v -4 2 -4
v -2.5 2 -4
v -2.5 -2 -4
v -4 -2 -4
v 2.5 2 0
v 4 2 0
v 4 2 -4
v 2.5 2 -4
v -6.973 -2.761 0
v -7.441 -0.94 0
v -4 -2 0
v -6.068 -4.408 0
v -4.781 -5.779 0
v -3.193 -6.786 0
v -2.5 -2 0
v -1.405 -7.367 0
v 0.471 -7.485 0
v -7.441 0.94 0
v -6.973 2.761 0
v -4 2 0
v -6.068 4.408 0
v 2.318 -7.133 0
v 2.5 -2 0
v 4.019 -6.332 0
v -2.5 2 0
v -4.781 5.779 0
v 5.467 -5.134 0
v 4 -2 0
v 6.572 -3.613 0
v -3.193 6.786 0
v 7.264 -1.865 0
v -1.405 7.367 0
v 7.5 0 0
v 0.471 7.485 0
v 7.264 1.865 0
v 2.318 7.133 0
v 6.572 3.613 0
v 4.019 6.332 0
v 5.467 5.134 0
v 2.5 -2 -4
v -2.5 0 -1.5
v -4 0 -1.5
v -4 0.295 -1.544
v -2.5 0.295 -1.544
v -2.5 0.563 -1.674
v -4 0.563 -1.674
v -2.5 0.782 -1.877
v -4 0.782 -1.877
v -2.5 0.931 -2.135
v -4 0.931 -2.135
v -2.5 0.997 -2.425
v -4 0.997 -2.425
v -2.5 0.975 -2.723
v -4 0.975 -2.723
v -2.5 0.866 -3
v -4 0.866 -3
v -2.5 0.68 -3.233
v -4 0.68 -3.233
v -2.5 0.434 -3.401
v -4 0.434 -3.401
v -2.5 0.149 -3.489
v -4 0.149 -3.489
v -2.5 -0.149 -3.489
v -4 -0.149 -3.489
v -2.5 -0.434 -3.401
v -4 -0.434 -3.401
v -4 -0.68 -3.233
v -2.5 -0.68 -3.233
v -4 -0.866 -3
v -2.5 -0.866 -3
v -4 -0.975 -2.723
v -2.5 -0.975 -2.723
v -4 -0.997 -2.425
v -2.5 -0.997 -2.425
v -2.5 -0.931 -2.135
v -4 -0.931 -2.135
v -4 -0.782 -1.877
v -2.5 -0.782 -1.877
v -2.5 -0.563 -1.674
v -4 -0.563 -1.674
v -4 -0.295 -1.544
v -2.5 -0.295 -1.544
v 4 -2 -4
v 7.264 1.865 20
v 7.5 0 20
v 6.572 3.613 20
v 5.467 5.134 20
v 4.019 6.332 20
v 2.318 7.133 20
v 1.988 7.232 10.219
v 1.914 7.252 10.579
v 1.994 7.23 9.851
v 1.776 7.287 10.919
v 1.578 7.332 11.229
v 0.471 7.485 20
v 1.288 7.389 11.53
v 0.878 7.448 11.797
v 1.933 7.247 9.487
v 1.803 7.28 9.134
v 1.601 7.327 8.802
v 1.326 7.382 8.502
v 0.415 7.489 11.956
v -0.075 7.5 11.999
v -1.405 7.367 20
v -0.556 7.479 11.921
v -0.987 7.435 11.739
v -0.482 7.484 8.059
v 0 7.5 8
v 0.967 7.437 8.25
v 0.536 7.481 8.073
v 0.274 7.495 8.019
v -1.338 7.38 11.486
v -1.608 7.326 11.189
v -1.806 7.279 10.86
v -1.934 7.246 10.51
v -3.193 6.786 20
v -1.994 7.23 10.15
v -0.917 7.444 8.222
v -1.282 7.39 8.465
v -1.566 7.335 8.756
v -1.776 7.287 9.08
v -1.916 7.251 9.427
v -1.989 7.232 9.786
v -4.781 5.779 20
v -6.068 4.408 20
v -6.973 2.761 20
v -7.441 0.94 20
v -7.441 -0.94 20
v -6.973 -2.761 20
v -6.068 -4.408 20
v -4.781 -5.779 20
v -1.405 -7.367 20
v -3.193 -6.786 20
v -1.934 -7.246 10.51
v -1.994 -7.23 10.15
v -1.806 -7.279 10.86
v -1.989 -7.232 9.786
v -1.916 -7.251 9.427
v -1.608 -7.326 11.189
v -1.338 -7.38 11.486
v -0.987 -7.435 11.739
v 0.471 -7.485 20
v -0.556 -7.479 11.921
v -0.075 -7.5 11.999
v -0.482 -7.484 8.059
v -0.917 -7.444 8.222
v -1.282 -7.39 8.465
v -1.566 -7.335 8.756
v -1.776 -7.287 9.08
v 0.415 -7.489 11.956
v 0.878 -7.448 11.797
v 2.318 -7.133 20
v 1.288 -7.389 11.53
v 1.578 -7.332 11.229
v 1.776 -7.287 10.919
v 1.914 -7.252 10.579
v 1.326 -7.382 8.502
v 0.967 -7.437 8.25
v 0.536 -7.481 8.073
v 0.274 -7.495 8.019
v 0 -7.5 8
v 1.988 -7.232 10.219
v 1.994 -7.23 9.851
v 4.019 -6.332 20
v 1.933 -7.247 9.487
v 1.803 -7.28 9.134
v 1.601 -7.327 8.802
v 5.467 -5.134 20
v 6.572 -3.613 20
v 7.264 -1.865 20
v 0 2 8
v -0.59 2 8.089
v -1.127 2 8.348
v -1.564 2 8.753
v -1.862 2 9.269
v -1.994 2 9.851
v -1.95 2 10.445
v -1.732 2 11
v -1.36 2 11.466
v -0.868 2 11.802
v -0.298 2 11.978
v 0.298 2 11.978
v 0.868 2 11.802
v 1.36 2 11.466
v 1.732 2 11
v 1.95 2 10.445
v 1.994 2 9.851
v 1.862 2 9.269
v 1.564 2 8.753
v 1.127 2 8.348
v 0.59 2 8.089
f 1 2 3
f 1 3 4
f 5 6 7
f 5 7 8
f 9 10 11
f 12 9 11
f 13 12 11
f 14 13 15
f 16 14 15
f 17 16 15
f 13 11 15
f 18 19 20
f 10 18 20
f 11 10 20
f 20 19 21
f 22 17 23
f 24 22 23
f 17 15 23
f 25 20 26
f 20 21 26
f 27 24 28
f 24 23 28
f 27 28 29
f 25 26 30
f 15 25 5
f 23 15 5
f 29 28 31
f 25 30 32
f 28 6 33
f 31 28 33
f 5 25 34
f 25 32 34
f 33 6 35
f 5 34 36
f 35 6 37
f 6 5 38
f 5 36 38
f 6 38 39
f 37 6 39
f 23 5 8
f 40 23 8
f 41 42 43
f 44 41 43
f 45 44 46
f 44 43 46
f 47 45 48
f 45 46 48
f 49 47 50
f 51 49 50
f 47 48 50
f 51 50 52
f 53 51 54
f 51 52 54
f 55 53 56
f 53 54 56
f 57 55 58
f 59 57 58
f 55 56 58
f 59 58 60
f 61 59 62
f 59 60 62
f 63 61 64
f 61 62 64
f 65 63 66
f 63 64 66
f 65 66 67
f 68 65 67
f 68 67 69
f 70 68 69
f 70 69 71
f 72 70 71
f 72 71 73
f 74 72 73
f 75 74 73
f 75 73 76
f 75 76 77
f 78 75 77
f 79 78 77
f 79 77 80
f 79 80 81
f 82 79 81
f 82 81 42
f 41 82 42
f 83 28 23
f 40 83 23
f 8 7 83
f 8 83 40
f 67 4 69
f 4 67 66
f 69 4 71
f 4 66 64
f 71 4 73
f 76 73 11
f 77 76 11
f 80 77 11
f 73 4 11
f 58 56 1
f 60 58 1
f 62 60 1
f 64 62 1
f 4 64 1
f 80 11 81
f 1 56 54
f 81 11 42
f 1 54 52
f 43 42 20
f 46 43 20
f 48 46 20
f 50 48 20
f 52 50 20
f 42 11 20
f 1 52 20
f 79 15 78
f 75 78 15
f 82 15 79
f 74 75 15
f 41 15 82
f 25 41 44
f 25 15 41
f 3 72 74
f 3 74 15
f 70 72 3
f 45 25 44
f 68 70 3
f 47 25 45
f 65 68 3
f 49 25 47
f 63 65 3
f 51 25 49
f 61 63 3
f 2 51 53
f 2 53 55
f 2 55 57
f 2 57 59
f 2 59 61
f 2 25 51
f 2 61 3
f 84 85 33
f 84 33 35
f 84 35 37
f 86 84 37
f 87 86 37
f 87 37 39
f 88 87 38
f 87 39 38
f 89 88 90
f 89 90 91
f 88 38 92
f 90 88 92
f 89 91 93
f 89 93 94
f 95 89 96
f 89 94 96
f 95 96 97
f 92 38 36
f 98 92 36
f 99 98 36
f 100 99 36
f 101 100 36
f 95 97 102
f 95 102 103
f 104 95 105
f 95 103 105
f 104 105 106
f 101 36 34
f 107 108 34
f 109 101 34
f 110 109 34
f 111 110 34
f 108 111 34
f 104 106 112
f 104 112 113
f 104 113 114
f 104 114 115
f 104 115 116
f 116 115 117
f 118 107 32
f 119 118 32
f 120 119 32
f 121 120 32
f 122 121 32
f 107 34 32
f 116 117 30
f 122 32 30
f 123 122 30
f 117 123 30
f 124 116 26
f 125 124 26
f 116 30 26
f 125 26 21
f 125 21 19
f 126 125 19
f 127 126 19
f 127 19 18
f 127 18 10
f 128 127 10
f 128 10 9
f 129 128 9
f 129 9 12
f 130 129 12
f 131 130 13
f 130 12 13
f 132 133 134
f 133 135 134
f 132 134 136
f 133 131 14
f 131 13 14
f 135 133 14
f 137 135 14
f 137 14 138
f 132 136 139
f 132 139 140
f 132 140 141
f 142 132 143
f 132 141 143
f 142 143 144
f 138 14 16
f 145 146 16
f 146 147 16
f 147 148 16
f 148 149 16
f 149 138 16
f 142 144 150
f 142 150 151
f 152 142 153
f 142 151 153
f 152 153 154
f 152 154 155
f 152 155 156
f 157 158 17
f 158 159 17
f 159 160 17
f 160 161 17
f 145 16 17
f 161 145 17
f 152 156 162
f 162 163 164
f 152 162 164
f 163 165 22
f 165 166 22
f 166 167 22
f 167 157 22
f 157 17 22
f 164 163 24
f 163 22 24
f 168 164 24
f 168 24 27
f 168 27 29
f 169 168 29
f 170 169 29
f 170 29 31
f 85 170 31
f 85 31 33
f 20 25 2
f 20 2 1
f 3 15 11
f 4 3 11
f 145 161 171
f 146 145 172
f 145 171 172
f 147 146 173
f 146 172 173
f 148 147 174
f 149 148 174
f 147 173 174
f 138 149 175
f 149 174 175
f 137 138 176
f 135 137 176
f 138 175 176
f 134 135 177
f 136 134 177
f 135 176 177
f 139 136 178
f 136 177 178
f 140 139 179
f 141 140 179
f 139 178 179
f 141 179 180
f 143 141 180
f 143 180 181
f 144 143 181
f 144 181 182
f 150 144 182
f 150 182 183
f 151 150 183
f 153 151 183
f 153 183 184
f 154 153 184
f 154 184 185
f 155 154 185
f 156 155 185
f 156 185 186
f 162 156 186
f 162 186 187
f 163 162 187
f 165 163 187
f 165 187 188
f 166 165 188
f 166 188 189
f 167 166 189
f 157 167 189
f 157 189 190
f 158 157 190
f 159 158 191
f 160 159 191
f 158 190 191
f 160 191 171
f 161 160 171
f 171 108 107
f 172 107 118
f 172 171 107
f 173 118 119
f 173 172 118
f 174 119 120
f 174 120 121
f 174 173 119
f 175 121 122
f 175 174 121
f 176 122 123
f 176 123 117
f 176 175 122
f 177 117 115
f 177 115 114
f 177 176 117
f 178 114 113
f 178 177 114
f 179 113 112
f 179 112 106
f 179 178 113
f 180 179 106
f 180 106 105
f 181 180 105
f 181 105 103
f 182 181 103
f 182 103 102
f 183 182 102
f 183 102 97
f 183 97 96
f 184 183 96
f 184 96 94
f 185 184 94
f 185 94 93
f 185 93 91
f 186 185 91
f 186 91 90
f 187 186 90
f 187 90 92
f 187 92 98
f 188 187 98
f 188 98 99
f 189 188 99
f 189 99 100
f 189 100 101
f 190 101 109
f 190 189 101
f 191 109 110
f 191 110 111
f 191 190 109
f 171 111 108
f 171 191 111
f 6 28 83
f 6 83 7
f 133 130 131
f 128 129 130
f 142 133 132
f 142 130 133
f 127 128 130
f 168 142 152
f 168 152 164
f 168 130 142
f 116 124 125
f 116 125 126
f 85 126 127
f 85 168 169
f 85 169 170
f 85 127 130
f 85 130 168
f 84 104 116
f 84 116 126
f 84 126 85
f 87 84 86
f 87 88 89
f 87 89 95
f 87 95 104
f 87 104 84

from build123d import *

# Parameters (mm, degrees)
CROQUIS1_R                             = 7.5
SALIENTE_EXTRUIR1_DEPTH                = 20
CROQUIS2_W                             = 5
CROQUIS2_H                             = 4
SALIENTE_EXTRUIR2_DEPTH                = 4
CROQUIS4_W                             = 8
CROQUIS4_H                             = 4
SALIENTE_EXTRUIR4_DEPTH                = 4
CORTAR_EXTRUIR1_REACH                  = 28.879
CROQUIS6_W                             = 5
CROQUIS6_H                             = 4
CROQUIS6_W_2                           = 2.5
CROQUIS7_R                             = 1
CORTAR_EXTRUIR2_DEPTH                  = 5
CORTAR_EXTRUIR3_REACH                  = 28.879
CORTAR_EXTRUIR3_END_RADIUS             = 7.5
CROQUIS8_R                             = 2
CORTAR_EXTRUIR3_DIRECTION_2_REACH      = 28.879
CORTAR_EXTRUIR3_DIRECTION_2_END_RADIUS = 7.5
CROQUIS9_W                             = 4
CROQUIS9_H                             = 4
CORTAR_EXTRUIR4_DEPTH                  = 5


with BuildPart() as part:
    # Croquis1 → Saliente-Extruir1 (new body)
    with BuildSketch(Plane.XY):
        Circle(CROQUIS1_R)
    extrude(amount=SALIENTE_EXTRUIR1_DEPTH)

    # Croquis2 → Saliente-Extruir2 (add)
    with BuildSketch(Plane.XY.offset(20)):
        Rectangle(CROQUIS2_W, CROQUIS2_H)
    extrude(amount=SALIENTE_EXTRUIR2_DEPTH)

    # Croquis4 → Saliente-Extruir4 (add)
    with BuildSketch(Plane(origin=(0, 0, 0), x_dir=(-1, 0, 0), z_dir=(0, 0, -1))):
        Rectangle(CROQUIS4_W, CROQUIS4_H)
    extrude(amount=SALIENTE_EXTRUIR4_DEPTH)

    # Croquis6 → Cortar-Extruir1 (cut, up to next)
    with BuildSketch(Plane(origin=(0, 2, 0), x_dir=(1, 0, 0), z_dir=(0, 1, 0)), mode=Mode.PRIVATE) as cortar_extruir1_sk1:
        with Locations((0, 2)):
            Rectangle(CROQUIS6_W, CROQUIS6_H)
    cortar_extruir1_tool1 = extrude(cortar_extruir1_sk1.sketch, amount=-CORTAR_EXTRUIR1_REACH, mode=Mode.PRIVATE) & part.part
    # Croquis6 → Cortar-Extruir1 (cut, up to next)
    with BuildSketch(Plane(origin=(0, 2, 0), x_dir=(1, 0, 0), z_dir=(0, 1, 0)), mode=Mode.PRIVATE) as cortar_extruir1_sk2:
        with Locations((0, -22)):
            Rectangle(CROQUIS6_W_2, CROQUIS6_H)
    cortar_extruir1_tool2 = extrude(cortar_extruir1_sk2.sketch, amount=-CORTAR_EXTRUIR1_REACH, mode=Mode.PRIVATE) & part.part
    add(cortar_extruir1_tool1.solids().sort_by_distance((0, 2, -2))[0], mode=Mode.SUBTRACT)
    add(cortar_extruir1_tool2.solids().sort_by_distance((0, 2, 22))[0], mode=Mode.SUBTRACT)

    # Croquis7 → Cortar-Extruir2 (cut)
    with BuildSketch(Plane.ZY.offset(4)):
        with Locations((-2.5, 0)):
            Circle(CROQUIS7_R)
        with Locations((22.5, 0)):
            Circle(CROQUIS7_R)
    extrude(amount=-CORTAR_EXTRUIR2_DEPTH, mode=Mode.SUBTRACT)

    # Cortar-Extruir3: up to this cylinder (the profile starts inside it)
    cortar_extruir3_end = Plane(origin=(0, 0, 10), z_dir=(0, 0, -1)) * Cylinder(CORTAR_EXTRUIR3_END_RADIUS, 73.758, mode=Mode.PRIVATE)
    # Croquis8 → Cortar-Extruir3 (cut, up to the surface)
    with BuildSketch(Plane(origin=(0, 2, 0), x_dir=(1, 0, 0), z_dir=(0, 1, 0)), mode=Mode.PRIVATE) as cortar_extruir3_sk1:
        with Locations(Location((0, -10, 0), (0, 0, 90))):
            Circle(CROQUIS8_R)
    cortar_extruir3_tool1 = extrude(cortar_extruir3_sk1.sketch, amount=-CORTAR_EXTRUIR3_REACH, mode=Mode.PRIVATE) & cortar_extruir3_end
    add(cortar_extruir3_tool1.solids().sort_by_distance((0, 2, 10))[0], mode=Mode.SUBTRACT)

    # Cortar-Extruir3 direction 2: up to this cylinder (the profile starts inside it)
    cortar_extruir3_direction_2_end = Plane(origin=(0, 0, 10), z_dir=(0, 0, -1)) * Cylinder(CORTAR_EXTRUIR3_DIRECTION_2_END_RADIUS, 73.758, mode=Mode.PRIVATE)
    # Croquis8 → Cortar-Extruir3 direction 2 (cut, up to the surface)
    with BuildSketch(Plane(origin=(0, 2, 0), x_dir=(1, 0, 0), z_dir=(0, 1, 0)), mode=Mode.PRIVATE) as cortar_extruir3_direction_2_sk1:
        with Locations(Location((0, -10, 0), (0, 0, 90))):
            Circle(CROQUIS8_R)
    cortar_extruir3_direction_2_tool1 = extrude(cortar_extruir3_direction_2_sk1.sketch, amount=CORTAR_EXTRUIR3_DIRECTION_2_REACH, mode=Mode.PRIVATE) & cortar_extruir3_direction_2_end
    add(cortar_extruir3_direction_2_tool1.solids().sort_by_distance((0, 2, 10))[0], mode=Mode.SUBTRACT)

    # Croquis9 → Cortar-Extruir4 (cut)
    with BuildSketch(Plane(origin=(2.5, 0, 0), x_dir=(0, 0, -1), z_dir=(1, 0, 0))):
        with Locations((-22, 0)):
            Rectangle(CROQUIS9_W, CROQUIS9_H)
    extrude(amount=-CORTAR_EXTRUIR4_DEPTH, mode=Mode.SUBTRACT)


solid = part.part
